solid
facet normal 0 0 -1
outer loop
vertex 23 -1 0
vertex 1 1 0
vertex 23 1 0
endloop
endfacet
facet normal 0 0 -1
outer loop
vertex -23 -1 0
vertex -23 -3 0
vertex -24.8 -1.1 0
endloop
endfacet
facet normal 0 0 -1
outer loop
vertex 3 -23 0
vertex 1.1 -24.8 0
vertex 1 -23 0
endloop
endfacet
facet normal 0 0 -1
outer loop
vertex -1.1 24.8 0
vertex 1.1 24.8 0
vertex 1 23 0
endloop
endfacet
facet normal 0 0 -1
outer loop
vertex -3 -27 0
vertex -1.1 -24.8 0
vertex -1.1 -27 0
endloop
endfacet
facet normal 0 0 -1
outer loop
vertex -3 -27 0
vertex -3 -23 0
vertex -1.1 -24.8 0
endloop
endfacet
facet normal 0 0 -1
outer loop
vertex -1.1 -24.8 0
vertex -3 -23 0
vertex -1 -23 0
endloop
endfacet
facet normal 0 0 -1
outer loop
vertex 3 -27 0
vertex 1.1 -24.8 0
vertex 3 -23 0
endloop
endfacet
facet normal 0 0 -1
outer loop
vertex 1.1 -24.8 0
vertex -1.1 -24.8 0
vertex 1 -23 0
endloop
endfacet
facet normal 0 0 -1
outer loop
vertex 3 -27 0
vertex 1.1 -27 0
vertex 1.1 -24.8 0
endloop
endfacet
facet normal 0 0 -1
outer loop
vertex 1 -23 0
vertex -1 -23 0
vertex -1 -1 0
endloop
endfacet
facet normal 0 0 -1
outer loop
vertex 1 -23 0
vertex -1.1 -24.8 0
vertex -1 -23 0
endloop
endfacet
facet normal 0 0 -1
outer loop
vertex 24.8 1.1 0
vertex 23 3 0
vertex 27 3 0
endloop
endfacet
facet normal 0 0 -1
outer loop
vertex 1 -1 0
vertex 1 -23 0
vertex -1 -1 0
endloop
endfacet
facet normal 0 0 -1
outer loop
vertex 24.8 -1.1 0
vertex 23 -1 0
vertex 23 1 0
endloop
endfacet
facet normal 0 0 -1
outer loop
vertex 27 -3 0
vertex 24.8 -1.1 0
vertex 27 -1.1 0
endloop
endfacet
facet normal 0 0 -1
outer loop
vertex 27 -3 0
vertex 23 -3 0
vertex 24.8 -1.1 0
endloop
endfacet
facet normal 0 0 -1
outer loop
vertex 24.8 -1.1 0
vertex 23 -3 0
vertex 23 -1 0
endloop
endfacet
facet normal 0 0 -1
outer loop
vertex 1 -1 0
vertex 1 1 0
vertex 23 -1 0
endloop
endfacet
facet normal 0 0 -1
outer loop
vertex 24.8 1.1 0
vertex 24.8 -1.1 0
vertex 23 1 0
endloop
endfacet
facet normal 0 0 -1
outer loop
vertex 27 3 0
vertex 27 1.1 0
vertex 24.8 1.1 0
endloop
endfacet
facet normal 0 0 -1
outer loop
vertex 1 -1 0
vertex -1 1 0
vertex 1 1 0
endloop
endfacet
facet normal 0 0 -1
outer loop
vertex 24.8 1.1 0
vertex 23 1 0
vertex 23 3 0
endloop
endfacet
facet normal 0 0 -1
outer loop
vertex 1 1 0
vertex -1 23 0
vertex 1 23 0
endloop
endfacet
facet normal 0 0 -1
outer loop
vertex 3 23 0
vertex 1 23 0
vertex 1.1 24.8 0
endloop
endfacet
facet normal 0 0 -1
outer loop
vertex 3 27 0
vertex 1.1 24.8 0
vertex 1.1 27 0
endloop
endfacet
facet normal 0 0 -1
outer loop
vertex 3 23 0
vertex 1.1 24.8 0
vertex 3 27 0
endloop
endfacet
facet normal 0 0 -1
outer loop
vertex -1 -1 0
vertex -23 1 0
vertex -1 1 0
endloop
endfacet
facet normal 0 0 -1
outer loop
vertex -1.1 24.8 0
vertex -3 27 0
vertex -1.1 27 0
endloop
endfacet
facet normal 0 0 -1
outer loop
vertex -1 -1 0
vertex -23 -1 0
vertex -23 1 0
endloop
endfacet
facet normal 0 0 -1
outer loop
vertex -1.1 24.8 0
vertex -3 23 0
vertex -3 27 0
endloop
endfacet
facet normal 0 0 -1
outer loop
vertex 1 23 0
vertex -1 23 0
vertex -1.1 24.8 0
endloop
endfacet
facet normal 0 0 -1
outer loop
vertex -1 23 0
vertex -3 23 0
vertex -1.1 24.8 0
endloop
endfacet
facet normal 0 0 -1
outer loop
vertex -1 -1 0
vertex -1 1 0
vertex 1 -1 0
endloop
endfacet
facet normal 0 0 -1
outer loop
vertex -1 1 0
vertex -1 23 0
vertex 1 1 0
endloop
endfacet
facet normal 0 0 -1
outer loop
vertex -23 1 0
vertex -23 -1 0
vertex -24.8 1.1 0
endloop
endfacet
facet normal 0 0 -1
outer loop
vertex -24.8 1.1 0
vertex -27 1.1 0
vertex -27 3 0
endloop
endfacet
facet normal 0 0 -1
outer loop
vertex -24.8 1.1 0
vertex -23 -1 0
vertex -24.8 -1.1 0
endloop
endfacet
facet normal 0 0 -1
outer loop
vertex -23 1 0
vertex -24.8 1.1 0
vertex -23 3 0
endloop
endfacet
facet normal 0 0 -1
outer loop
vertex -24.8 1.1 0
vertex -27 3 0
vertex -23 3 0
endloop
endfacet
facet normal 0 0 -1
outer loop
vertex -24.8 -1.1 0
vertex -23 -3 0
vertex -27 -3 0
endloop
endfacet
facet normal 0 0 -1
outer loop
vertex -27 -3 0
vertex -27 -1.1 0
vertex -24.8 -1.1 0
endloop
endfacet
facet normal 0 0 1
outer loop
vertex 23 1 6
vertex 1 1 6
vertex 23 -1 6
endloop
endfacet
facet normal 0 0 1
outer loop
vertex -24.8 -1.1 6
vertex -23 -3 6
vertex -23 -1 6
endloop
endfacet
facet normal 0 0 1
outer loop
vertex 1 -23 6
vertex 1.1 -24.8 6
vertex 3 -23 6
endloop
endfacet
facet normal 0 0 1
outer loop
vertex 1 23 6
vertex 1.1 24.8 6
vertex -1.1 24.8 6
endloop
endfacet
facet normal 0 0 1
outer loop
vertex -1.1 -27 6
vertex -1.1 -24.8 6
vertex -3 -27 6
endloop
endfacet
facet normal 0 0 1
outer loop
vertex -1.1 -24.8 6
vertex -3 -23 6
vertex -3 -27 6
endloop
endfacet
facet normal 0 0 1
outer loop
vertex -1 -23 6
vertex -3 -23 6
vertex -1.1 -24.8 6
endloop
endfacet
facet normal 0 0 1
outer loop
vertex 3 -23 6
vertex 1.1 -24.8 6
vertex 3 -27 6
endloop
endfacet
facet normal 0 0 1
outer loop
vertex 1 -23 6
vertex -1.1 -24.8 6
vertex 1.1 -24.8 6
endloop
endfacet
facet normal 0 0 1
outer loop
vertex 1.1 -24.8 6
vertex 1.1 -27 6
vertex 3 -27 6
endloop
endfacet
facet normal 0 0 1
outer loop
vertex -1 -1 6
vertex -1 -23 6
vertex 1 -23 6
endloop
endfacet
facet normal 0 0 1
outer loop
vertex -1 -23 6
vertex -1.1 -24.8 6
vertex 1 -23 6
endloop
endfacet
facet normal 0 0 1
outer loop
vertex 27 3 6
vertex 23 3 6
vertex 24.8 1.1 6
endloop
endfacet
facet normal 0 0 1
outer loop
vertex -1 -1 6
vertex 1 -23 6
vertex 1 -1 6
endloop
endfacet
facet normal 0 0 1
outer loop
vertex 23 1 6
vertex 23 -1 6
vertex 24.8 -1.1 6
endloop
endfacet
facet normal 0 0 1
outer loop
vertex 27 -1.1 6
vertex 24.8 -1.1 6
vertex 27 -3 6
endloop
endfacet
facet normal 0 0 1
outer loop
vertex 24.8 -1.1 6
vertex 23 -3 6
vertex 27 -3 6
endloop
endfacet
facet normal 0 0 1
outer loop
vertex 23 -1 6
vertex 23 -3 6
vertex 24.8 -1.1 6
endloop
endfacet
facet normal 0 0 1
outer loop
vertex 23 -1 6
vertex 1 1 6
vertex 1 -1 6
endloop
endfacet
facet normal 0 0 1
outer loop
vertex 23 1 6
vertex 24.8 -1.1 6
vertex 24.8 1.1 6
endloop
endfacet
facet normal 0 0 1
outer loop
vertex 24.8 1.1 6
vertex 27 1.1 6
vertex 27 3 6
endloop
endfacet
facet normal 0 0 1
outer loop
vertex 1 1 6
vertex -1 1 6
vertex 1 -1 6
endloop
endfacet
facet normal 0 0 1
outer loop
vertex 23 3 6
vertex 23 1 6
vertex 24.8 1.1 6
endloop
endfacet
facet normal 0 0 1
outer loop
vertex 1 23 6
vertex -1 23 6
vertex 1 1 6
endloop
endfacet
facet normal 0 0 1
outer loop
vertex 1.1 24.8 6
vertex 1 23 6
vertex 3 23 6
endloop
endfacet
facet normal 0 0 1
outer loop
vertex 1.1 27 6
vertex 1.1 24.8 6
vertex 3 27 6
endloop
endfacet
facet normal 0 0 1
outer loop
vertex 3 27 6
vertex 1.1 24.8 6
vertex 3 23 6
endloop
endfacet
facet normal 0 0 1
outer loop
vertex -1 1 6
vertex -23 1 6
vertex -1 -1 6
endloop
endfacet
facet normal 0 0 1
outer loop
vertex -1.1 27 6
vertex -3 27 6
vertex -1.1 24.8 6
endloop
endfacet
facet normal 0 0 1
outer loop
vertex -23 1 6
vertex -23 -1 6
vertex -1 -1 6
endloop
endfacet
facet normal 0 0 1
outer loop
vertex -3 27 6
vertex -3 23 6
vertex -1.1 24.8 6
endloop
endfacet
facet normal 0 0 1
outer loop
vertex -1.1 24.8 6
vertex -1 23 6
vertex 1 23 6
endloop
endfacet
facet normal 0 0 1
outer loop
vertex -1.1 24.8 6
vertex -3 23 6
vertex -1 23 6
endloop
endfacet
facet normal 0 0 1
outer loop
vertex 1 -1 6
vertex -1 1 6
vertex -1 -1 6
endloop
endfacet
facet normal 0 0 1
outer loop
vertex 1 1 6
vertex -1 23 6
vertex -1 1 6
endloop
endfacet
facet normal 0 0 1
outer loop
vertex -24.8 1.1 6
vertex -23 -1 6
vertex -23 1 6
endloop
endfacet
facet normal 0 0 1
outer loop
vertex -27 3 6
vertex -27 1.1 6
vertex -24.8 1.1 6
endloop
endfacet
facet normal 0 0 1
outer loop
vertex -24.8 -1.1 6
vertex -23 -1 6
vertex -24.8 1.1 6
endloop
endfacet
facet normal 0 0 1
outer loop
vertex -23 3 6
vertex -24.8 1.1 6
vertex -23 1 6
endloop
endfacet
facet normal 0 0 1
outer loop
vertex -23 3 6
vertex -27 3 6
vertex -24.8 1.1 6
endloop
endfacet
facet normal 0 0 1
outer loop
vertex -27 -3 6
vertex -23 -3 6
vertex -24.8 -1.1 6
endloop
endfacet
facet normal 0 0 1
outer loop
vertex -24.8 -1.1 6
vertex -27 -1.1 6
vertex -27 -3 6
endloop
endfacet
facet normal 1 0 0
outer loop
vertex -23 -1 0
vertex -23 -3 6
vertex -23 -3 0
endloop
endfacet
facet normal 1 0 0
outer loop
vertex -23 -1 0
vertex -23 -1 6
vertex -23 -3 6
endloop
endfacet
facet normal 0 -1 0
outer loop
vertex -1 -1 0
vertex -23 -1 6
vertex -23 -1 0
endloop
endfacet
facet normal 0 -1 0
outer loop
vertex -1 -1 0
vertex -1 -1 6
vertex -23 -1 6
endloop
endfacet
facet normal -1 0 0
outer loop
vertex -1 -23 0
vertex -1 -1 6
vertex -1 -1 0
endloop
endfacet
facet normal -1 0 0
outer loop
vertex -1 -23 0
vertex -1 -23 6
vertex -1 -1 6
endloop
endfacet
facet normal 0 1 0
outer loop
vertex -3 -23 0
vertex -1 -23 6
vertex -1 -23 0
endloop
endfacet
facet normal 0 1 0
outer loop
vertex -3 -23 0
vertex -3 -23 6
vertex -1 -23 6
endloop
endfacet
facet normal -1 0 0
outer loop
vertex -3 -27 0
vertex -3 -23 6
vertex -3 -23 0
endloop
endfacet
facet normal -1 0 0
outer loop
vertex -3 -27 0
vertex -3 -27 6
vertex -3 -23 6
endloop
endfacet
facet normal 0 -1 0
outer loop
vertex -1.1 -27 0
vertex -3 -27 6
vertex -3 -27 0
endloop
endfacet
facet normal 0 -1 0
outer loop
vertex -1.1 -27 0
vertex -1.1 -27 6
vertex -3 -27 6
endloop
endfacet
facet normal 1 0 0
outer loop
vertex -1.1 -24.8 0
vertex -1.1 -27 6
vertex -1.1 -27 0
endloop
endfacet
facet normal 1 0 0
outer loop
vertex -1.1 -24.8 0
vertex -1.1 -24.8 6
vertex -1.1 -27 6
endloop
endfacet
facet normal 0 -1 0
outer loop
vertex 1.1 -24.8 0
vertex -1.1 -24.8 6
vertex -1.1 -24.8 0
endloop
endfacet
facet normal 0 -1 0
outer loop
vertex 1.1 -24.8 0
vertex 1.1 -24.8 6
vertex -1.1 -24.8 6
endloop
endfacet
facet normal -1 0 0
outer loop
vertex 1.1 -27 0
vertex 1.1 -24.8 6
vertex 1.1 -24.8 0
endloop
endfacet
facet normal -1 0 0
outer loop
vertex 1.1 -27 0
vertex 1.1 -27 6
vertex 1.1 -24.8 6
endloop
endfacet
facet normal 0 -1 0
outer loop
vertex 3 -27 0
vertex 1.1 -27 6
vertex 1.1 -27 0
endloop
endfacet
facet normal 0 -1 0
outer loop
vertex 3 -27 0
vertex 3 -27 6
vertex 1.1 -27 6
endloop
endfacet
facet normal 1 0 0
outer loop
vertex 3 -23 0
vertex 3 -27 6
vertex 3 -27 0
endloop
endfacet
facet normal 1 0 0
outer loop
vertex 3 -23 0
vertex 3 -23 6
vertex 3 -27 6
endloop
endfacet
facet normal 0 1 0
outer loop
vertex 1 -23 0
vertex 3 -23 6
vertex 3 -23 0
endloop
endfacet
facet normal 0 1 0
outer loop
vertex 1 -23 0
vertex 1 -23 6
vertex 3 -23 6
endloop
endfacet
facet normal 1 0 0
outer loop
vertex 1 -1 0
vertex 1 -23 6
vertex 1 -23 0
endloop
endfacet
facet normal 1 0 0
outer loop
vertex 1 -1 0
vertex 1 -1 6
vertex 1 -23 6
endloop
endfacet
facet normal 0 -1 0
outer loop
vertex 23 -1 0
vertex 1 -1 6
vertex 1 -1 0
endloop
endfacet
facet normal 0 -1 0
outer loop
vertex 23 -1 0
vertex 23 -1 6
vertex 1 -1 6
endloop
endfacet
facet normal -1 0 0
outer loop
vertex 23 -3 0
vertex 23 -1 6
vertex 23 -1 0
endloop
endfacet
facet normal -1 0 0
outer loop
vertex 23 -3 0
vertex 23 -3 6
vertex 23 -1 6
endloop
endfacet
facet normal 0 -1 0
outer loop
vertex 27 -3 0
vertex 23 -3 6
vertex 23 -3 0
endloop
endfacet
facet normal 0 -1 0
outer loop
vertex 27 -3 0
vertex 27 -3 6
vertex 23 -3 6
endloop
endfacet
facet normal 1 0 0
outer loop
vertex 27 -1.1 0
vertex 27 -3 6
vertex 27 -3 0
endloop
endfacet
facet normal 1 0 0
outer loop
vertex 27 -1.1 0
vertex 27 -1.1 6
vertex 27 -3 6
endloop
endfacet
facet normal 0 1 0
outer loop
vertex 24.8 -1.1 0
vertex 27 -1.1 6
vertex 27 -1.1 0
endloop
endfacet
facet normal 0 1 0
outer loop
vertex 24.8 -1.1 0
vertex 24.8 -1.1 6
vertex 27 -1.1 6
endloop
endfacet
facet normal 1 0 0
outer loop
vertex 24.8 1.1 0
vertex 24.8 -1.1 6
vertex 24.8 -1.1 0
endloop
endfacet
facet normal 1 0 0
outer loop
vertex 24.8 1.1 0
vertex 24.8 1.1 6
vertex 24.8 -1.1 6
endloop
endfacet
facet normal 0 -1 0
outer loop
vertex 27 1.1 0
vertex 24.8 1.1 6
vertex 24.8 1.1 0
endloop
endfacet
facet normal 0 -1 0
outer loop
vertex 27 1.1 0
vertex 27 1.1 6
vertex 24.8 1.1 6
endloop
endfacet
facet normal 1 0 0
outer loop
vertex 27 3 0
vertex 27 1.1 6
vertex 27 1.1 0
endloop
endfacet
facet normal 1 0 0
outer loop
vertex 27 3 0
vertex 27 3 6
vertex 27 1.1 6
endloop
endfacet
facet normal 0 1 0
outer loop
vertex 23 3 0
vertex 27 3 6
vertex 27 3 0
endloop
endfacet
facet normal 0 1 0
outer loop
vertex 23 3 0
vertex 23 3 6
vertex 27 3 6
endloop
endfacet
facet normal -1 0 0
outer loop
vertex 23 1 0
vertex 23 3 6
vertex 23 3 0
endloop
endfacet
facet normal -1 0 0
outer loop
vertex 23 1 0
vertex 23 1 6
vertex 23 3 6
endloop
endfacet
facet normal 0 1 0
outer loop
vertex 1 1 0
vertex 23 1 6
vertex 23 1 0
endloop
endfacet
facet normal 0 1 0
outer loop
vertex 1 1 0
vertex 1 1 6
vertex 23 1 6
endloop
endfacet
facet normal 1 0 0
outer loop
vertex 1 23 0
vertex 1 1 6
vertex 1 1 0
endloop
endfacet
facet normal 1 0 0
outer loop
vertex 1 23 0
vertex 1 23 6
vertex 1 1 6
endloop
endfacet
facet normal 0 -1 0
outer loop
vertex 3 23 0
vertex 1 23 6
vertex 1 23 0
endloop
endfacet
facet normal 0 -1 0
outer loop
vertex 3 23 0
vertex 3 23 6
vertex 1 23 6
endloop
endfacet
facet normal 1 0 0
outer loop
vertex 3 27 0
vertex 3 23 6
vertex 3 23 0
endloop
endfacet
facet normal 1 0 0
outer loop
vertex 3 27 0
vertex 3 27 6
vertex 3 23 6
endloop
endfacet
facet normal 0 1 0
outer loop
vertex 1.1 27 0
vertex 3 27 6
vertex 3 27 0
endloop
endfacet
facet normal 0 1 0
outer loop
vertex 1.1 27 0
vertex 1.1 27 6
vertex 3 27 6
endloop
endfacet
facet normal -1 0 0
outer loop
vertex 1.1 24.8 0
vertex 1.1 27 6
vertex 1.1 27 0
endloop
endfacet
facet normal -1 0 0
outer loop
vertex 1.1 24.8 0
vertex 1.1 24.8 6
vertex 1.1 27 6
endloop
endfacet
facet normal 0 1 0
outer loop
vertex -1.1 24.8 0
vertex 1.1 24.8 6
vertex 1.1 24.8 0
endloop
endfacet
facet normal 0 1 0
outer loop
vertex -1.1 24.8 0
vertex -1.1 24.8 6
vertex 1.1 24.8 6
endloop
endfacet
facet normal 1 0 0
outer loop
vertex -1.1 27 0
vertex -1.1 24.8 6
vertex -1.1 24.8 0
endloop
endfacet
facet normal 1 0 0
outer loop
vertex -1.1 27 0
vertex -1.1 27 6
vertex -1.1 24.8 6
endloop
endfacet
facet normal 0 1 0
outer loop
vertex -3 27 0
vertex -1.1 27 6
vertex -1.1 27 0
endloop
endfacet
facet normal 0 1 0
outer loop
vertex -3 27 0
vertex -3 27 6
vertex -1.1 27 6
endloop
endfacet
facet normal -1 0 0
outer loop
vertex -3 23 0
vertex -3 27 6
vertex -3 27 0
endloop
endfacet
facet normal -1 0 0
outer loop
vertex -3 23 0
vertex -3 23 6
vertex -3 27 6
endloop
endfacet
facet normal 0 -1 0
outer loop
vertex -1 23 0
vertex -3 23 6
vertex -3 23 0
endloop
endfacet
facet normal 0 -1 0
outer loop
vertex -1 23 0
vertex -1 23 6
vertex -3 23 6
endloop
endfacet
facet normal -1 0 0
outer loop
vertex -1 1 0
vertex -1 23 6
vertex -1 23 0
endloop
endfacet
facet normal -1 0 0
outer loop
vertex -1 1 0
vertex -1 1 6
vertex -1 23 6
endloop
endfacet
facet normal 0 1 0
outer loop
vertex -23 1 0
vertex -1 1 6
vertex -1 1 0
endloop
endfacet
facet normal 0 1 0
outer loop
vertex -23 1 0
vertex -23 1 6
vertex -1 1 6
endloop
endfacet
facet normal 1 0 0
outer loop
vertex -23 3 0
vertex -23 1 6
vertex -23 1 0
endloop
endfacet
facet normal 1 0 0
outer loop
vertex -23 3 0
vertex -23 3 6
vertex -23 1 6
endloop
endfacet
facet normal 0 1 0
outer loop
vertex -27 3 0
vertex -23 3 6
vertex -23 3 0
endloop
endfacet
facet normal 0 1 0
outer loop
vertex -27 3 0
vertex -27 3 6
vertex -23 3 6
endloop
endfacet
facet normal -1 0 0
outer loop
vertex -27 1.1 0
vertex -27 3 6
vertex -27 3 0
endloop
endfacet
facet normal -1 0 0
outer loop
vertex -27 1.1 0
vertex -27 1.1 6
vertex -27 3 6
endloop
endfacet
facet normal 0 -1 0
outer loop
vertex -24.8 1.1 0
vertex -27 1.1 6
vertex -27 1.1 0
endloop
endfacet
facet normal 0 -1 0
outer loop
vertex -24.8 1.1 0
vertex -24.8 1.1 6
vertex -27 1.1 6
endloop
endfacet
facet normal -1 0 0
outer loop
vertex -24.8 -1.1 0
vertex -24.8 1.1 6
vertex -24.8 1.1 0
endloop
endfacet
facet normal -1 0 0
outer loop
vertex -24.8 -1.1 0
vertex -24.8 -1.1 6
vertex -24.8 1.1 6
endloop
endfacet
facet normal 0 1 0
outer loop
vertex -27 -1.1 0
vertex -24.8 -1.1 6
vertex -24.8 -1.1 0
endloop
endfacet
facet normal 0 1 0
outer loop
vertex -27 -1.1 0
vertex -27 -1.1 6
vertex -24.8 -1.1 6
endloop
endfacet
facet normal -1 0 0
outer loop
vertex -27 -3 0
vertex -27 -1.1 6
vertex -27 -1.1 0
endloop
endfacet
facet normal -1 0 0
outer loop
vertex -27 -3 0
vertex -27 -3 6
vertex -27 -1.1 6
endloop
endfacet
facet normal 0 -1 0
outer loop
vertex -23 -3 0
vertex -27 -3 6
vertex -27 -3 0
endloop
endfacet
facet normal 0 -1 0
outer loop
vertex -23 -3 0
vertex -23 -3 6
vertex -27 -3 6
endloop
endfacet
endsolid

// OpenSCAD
// file: box.scad
include <config.scad>;

module tooth(h, b, a, t) {
	// h = height
	// b = longer edge
	// a = shorter edge
	// t = tolerance (added equally all around)

	x1 = 1/2 * a + t;
	y1 = h;
	x2 = 1/2 * b + t;
	y2 = 0;

	m = (y2 - y1)/(x2 - x1);
	b = y1 - m * x1;

	function x(y) = (y-b)/m;

	polygon([
		[-x(-t), -t],
		[x(-t), -t],
		[x(h+t), h+t],
		[-x(h+t), h+t]
	]);
}


module pegs(peg_height, peg_width, id) {
	for (x = [-1, 1], r = [0, 90])
		rotate([0, 0, r])
		translate([x * (id - peg_height)/2 , 0])
		square([peg_height, peg_width], true);
}

module rounded_rect(w, h, bevel)
{
	hull()
	{
		// place 4 circles in the corners, with the given radius
		for (x = [-1, 1], y = [-1, 1])
			translate([x * (w/2 - bevel), y * (h/2 - bevel)])
			circle(r=bevel);
	}
}


module box(od, depth, thickness, teeth, box_color, drawer_color) {
	step = od/(teeth+1);
	
	tooth_top = 7.5;
	tooth_bottom = 5;
	bevel = 10;
	
	tolerance = 0.2;
	id = od - thickness * 2 - tooth_height;

	linear_extrude(depth, false)
	{
		difference() {
			union() {
				// Body
				difference() {
					union() {
						translate([tooth_height, tooth_height]/2)
							rounded_rect(od - tooth_height, od - tooth_height, bevel);
						rounded_rect(od, od, bevel);
					}
					translate([tooth_height, tooth_height]/2)
						rounded_rect(id, id, bevel - thickness);
				}

				// Teeth
				for (i = [-od/2 + step : step : od/2 - step], j = [0,-90])
					rotate([0, 0, j])
					translate([i, od/2, 0])
					tooth(tooth_height, tooth_bottom, tooth_top, 0);
			}

			// Sockets
			for (i = [-od/2 + step : step : od/2 - step], j = [0,-90])
				rotate([0, 0, j])
				translate([i, -od/2, 0])
				tooth(tooth_height, tooth_bottom, tooth_top, tolerance);
		}
	}
				
	// Pegs in the center of each side to support drawers
	linear_extrude(depth - 2, false)
		translate([tooth_height, tooth_height]/2)
		pegs(peg_size, peg_size, id);

	color(drawer_color)
	linear_extrude(height=2, center=false)
	{
		translate([tooth_height, tooth_height]/2)
		rounded_rect(id, id, bevel - thickness);
	}
}

rows = 4;
*translate([-(rows-1)/2*s,0,0])
	for (row = [0:rows-1]) {
		y = (2 * row + 1) * s/2;

		for (col = [0:rows-1-row]) {
			x = (2 * col + row) * s/2;
			translate([x, y, 0])
			box(s, d, thickness, teeth, "green", "green");
		}
	}

*for (i = [0:1]) {
	translate([0,-(i + 1/2) * s, 0])
	color("brown")
	box(s, d, thickness, teeth);
}

%translate([-s/2, 0])
box(s, d, thickness, teeth, "green", "red");
%translate([0, s])
box(s, d, thickness, teeth, "green", "red");
translate([s/2, 0])
box(s, d, thickness, teeth, "blue", "red");
// file: config.scad
$fs=0.1;
$fa=1;

s = 60;
bevel = 10;
thickness = 2.25;
d = 10;

teeth = 3;
tooth_height = 1.5;
tooth_top = 7.5;
tooth_bottom = 5;

peg_size = 2;

drawer_thickness = 2.25;
// main file
include <config.scad>;

use <box.scad>;

%translate(-[tooth_height, tooth_height, 4]/2)
	box(s, d, thickness, teeth, "green", "blue");

tol = 0.1;
od = s - thickness*2 - tooth_height;

echo(od);

module divider() {
	linear_extrude(d-4) {
		difference() {
			union() {
				square([od - 2*tol, peg_size], true);
				rotate([0, 0, 90])
					square([od - 2*tol, peg_size], true);
				pegs(2 * peg_size, 3 * peg_size, od);
			}
			pegs(peg_size + 2*tol, peg_size + 2*tol, od);
		}
	}
}

divider();
